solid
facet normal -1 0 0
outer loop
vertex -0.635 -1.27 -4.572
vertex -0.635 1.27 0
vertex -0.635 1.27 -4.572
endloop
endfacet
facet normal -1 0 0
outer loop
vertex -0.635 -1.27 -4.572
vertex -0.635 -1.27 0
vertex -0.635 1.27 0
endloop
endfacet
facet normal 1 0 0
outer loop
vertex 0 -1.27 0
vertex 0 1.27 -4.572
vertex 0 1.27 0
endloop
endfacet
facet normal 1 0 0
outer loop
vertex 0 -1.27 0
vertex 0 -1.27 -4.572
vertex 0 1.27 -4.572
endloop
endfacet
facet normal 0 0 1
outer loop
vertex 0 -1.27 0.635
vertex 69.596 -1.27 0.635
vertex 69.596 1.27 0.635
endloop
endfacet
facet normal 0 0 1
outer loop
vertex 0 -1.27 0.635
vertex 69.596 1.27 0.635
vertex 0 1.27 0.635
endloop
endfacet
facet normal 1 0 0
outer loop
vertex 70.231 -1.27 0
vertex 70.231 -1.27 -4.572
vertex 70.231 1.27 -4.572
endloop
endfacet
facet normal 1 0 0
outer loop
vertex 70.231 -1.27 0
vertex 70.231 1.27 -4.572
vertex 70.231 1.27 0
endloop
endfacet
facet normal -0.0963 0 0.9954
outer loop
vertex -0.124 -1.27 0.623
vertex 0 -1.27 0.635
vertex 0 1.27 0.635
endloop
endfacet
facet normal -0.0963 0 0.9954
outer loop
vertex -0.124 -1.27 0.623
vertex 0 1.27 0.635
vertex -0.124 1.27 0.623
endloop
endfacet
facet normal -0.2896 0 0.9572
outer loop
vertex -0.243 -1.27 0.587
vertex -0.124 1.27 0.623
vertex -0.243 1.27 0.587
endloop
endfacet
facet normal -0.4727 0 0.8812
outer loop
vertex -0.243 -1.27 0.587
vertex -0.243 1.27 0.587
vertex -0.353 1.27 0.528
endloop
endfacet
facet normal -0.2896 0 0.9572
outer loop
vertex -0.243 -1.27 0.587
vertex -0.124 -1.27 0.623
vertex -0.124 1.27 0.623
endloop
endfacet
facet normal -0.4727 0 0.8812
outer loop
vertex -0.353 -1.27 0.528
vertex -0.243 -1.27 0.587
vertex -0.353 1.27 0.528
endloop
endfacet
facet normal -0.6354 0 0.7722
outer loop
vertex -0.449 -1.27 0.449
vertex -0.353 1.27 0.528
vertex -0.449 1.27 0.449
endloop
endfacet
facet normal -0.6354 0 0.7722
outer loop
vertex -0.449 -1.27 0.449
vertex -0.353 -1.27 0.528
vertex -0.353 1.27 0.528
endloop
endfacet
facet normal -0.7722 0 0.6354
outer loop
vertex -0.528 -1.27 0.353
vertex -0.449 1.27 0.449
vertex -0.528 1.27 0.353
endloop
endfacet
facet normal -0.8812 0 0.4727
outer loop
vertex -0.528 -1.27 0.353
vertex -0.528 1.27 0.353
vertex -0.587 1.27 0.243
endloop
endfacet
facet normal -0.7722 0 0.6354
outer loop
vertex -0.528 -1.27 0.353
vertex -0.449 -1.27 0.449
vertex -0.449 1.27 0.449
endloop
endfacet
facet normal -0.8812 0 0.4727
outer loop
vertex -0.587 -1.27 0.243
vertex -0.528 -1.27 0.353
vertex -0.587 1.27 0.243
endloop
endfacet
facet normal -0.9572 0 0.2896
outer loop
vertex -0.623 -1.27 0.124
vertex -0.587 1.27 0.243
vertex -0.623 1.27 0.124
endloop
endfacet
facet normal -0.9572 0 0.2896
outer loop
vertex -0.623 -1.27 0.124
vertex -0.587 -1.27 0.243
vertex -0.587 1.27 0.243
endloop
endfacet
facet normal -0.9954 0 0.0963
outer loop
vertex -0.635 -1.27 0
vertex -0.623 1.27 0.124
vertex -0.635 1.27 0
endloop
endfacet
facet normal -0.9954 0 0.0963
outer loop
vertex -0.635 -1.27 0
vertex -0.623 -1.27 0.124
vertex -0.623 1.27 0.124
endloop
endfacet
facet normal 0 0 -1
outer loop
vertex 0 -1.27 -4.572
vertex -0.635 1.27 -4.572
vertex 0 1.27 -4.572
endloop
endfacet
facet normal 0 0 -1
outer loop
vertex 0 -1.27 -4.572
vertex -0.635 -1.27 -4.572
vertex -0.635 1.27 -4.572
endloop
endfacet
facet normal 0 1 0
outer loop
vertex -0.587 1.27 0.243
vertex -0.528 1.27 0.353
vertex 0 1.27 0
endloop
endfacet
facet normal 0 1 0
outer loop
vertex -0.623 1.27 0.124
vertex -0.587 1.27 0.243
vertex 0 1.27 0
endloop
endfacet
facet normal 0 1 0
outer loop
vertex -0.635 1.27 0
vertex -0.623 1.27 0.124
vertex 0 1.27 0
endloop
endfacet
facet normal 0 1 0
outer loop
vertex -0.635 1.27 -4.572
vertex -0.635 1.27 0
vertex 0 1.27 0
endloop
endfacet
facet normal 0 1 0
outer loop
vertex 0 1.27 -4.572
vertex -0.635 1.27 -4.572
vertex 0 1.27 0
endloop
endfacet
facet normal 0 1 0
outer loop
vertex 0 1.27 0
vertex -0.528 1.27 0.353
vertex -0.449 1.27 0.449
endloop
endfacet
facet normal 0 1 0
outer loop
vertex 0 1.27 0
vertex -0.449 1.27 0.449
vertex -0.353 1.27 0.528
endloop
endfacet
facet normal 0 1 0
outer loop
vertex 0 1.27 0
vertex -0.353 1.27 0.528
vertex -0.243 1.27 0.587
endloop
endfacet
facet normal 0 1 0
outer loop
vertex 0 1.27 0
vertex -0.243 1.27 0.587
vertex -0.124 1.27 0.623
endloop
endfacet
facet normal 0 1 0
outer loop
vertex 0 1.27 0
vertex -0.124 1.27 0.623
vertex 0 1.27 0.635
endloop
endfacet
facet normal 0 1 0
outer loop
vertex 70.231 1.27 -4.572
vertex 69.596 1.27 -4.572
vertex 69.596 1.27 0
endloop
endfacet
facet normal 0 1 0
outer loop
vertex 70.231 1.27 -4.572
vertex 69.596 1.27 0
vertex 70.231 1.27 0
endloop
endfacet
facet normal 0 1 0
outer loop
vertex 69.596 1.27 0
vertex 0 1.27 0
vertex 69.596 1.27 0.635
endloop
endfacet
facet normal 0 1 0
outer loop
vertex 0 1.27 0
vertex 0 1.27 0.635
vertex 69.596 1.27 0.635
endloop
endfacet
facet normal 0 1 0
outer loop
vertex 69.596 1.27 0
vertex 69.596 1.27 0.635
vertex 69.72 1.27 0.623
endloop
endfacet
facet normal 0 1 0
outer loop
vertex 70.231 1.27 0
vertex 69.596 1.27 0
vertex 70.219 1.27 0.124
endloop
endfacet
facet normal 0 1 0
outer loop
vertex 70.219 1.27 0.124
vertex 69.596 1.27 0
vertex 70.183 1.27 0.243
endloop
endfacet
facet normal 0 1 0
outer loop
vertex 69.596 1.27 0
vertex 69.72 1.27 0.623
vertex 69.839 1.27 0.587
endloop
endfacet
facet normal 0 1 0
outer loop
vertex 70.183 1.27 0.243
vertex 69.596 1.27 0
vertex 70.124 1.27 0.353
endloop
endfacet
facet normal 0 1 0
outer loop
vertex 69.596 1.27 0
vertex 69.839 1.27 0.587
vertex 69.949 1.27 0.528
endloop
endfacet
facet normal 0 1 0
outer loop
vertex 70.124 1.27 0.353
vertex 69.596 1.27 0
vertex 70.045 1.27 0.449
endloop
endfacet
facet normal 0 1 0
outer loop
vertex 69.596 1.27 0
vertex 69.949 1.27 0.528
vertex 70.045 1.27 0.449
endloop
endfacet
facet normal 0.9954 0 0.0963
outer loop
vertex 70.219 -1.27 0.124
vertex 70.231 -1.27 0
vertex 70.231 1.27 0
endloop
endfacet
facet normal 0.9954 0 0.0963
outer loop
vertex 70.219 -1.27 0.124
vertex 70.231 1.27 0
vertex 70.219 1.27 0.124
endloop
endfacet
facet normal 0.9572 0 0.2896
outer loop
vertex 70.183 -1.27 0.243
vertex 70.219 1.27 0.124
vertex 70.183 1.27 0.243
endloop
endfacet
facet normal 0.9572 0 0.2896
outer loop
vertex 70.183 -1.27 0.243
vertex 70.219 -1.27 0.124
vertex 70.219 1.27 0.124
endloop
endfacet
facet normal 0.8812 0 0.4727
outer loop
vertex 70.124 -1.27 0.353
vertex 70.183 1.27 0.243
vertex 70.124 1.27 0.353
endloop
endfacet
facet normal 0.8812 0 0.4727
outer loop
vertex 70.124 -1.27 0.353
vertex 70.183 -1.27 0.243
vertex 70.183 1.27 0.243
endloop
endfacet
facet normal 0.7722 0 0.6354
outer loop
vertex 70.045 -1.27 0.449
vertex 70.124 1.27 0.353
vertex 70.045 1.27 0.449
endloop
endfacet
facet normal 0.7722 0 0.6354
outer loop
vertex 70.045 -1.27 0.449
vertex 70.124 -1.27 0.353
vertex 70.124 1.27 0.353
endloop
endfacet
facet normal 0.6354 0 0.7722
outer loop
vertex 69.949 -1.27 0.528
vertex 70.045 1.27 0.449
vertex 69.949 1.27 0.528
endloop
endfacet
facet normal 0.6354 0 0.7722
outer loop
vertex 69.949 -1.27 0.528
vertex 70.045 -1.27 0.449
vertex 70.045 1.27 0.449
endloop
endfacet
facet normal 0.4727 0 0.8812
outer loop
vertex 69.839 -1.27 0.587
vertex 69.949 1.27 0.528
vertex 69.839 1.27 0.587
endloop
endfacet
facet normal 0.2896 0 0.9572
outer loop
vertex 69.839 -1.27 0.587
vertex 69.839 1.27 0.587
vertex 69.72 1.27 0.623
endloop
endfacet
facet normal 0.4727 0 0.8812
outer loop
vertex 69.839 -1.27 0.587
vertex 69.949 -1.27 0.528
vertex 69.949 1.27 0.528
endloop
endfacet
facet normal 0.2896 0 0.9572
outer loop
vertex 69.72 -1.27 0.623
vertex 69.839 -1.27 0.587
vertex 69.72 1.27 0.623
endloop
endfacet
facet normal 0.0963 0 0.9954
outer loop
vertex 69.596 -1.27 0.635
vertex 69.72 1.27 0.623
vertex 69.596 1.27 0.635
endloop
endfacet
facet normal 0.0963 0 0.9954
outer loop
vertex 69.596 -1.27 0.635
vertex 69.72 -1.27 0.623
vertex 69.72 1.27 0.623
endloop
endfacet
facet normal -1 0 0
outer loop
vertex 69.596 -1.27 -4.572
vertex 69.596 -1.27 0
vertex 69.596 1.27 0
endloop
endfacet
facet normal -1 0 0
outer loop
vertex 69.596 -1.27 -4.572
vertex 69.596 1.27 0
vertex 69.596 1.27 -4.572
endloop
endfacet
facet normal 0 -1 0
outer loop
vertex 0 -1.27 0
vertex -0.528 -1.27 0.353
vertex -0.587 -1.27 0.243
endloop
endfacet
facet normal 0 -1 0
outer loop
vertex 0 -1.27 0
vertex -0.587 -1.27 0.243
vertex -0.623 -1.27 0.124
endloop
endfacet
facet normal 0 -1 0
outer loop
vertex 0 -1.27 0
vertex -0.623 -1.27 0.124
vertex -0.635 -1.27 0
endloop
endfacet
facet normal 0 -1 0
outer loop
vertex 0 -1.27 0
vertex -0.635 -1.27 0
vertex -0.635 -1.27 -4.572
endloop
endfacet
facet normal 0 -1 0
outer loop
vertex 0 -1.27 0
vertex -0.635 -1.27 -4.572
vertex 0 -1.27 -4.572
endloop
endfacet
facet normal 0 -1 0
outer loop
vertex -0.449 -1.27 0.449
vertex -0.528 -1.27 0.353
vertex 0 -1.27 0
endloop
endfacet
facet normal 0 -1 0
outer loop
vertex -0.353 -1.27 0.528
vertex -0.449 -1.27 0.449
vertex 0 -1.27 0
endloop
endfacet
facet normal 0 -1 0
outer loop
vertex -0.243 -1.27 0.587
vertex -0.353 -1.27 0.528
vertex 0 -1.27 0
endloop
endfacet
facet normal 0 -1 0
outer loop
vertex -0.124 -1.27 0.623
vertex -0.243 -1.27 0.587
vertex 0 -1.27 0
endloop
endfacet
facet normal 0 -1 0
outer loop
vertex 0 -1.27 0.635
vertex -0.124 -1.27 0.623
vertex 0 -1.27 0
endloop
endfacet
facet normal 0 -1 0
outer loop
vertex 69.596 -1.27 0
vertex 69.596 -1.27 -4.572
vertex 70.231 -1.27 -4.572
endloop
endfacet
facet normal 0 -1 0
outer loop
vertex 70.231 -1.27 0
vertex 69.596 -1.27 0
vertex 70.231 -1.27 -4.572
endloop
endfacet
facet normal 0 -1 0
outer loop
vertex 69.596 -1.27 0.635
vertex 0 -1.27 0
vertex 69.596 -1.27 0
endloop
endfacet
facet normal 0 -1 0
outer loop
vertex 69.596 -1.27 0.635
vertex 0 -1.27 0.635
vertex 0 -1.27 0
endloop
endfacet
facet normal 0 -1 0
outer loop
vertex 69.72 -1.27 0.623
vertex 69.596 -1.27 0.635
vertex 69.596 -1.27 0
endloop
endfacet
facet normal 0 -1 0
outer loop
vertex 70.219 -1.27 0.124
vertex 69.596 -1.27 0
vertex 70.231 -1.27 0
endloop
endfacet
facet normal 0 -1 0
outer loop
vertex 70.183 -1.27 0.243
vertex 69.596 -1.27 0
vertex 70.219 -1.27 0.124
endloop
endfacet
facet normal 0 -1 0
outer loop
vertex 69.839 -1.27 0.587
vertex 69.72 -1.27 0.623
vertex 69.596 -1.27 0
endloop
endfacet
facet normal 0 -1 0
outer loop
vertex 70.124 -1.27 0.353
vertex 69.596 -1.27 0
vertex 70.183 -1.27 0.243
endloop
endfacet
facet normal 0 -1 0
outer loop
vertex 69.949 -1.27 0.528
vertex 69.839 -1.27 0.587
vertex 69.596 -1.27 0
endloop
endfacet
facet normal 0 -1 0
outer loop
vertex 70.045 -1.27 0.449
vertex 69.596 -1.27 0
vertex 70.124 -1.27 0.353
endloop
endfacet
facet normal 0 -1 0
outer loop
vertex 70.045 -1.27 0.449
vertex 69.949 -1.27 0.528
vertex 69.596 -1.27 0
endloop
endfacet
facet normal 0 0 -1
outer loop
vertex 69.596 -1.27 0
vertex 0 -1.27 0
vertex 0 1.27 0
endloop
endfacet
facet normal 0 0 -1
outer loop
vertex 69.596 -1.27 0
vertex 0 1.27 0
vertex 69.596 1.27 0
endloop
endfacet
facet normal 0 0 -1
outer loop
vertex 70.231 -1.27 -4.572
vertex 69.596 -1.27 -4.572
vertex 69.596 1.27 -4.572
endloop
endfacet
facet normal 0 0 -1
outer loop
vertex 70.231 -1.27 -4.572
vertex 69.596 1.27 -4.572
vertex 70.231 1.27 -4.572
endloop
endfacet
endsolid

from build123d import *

# Parameters (mm, degrees)
F1_DEPTH = 1.27


with BuildPart() as f1:
    # F0 (on Front) → F1 (new body, symmetric)
    with BuildSketch(Plane.XZ):
        with BuildLine():
            Line((0, -4.572), (0, 0))
            Line((0, 0), (69.596, 0))
            Line((69.596, 0), (69.596, -4.572))
            Line((69.596, -4.572), (70.231, -4.572))
            Line((70.231, -4.572), (70.231, 0))
            ThreePointArc((70.231, 0), (70.0450128061, 0.4490128061), (69.596, 0.635))
            Line((69.596, 0.635), (0, 0.635))
            ThreePointArc((0, 0.635), (-0.4490128061, 0.4490128061), (-0.635, 0))
            Line((-0.635, 0), (-0.635, -4.572))
            Line((-0.635, -4.572), (0, -4.572))
        make_face()
    extrude(amount=F1_DEPTH, both=True)


solid = f1.part
